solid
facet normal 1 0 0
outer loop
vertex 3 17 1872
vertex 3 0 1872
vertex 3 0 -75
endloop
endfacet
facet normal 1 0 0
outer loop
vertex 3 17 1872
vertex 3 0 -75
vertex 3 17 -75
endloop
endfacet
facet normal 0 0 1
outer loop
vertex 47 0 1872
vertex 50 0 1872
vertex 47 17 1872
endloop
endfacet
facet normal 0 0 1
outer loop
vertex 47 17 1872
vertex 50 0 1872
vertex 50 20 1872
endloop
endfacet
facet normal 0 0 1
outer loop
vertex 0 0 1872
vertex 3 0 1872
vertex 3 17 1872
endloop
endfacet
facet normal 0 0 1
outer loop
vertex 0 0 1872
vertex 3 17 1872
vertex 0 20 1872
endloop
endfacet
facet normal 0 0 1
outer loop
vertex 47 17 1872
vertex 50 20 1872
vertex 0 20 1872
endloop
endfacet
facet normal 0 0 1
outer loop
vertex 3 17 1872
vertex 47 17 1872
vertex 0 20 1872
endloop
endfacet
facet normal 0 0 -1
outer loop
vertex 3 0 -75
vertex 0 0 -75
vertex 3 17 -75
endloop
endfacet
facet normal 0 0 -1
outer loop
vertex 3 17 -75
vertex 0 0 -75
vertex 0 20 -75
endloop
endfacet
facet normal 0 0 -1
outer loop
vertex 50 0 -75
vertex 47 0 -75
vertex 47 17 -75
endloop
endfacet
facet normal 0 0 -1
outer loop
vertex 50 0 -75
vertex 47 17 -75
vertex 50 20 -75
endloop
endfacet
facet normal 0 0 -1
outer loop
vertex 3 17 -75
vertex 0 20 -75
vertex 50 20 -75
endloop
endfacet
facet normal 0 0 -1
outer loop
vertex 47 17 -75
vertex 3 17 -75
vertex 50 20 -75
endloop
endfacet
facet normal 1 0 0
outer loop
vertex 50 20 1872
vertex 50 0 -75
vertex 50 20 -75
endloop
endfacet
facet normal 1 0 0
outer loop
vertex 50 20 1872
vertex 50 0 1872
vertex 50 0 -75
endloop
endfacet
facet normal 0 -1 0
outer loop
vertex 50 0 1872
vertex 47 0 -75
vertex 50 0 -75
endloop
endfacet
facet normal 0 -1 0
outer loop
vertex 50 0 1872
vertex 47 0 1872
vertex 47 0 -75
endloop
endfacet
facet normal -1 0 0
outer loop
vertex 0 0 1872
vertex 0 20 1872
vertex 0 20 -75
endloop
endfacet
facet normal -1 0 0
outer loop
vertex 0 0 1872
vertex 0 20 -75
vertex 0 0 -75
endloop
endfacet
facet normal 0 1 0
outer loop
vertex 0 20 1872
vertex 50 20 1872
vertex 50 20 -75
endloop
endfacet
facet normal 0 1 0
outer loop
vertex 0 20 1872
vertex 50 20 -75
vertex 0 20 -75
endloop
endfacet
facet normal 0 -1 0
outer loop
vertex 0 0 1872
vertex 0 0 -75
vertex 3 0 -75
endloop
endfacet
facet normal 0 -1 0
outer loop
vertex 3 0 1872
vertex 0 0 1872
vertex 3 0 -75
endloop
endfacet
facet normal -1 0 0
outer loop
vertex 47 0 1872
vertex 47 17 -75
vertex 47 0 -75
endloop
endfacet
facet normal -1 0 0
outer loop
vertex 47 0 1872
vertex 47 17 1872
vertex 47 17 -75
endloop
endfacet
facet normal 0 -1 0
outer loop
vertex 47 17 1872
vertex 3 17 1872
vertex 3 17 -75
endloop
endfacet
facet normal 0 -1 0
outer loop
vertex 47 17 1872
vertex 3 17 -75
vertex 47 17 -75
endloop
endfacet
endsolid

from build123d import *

# Parameters (mm, degrees)
BOSS_EXTRUDE1_DEPTH = 1825
DOWN_DEPTH          = 47
UP_DEPTH            = 75


with BuildPart() as part:
    # Sketch1 → Boss-Extrude1 (new body)
    with BuildSketch(Plane.XY):
        Polygon((0, 0), (0, 20), (50, 20), (50, 0), (47, 0), (47, 17), (3, 17), (3, 0), align=None)
    extrude(amount=BOSS_EXTRUDE1_DEPTH)

    # Sketch2 → Down (add)
    with BuildSketch(Plane.XY.offset(1825)):
        Polygon((0, 0), (0, 20), (50, 20), (50, 0), (47, 0), (47, 17), (3, 17), (3, 0), align=None)
    extrude(amount=DOWN_DEPTH)

    # Sketch3 → Up (add)
    with BuildSketch(Plane(origin=(0, 0, 0), x_dir=(-1, 0, 0), z_dir=(0, 0, -1))):
        Polygon((-50, 0), (-50, 20), (0, 20), (0, 0), (-3, 0), (-3, 17), (-47, 17), (-47, 0), align=None)
    extrude(amount=UP_DEPTH)


solid = part.part
